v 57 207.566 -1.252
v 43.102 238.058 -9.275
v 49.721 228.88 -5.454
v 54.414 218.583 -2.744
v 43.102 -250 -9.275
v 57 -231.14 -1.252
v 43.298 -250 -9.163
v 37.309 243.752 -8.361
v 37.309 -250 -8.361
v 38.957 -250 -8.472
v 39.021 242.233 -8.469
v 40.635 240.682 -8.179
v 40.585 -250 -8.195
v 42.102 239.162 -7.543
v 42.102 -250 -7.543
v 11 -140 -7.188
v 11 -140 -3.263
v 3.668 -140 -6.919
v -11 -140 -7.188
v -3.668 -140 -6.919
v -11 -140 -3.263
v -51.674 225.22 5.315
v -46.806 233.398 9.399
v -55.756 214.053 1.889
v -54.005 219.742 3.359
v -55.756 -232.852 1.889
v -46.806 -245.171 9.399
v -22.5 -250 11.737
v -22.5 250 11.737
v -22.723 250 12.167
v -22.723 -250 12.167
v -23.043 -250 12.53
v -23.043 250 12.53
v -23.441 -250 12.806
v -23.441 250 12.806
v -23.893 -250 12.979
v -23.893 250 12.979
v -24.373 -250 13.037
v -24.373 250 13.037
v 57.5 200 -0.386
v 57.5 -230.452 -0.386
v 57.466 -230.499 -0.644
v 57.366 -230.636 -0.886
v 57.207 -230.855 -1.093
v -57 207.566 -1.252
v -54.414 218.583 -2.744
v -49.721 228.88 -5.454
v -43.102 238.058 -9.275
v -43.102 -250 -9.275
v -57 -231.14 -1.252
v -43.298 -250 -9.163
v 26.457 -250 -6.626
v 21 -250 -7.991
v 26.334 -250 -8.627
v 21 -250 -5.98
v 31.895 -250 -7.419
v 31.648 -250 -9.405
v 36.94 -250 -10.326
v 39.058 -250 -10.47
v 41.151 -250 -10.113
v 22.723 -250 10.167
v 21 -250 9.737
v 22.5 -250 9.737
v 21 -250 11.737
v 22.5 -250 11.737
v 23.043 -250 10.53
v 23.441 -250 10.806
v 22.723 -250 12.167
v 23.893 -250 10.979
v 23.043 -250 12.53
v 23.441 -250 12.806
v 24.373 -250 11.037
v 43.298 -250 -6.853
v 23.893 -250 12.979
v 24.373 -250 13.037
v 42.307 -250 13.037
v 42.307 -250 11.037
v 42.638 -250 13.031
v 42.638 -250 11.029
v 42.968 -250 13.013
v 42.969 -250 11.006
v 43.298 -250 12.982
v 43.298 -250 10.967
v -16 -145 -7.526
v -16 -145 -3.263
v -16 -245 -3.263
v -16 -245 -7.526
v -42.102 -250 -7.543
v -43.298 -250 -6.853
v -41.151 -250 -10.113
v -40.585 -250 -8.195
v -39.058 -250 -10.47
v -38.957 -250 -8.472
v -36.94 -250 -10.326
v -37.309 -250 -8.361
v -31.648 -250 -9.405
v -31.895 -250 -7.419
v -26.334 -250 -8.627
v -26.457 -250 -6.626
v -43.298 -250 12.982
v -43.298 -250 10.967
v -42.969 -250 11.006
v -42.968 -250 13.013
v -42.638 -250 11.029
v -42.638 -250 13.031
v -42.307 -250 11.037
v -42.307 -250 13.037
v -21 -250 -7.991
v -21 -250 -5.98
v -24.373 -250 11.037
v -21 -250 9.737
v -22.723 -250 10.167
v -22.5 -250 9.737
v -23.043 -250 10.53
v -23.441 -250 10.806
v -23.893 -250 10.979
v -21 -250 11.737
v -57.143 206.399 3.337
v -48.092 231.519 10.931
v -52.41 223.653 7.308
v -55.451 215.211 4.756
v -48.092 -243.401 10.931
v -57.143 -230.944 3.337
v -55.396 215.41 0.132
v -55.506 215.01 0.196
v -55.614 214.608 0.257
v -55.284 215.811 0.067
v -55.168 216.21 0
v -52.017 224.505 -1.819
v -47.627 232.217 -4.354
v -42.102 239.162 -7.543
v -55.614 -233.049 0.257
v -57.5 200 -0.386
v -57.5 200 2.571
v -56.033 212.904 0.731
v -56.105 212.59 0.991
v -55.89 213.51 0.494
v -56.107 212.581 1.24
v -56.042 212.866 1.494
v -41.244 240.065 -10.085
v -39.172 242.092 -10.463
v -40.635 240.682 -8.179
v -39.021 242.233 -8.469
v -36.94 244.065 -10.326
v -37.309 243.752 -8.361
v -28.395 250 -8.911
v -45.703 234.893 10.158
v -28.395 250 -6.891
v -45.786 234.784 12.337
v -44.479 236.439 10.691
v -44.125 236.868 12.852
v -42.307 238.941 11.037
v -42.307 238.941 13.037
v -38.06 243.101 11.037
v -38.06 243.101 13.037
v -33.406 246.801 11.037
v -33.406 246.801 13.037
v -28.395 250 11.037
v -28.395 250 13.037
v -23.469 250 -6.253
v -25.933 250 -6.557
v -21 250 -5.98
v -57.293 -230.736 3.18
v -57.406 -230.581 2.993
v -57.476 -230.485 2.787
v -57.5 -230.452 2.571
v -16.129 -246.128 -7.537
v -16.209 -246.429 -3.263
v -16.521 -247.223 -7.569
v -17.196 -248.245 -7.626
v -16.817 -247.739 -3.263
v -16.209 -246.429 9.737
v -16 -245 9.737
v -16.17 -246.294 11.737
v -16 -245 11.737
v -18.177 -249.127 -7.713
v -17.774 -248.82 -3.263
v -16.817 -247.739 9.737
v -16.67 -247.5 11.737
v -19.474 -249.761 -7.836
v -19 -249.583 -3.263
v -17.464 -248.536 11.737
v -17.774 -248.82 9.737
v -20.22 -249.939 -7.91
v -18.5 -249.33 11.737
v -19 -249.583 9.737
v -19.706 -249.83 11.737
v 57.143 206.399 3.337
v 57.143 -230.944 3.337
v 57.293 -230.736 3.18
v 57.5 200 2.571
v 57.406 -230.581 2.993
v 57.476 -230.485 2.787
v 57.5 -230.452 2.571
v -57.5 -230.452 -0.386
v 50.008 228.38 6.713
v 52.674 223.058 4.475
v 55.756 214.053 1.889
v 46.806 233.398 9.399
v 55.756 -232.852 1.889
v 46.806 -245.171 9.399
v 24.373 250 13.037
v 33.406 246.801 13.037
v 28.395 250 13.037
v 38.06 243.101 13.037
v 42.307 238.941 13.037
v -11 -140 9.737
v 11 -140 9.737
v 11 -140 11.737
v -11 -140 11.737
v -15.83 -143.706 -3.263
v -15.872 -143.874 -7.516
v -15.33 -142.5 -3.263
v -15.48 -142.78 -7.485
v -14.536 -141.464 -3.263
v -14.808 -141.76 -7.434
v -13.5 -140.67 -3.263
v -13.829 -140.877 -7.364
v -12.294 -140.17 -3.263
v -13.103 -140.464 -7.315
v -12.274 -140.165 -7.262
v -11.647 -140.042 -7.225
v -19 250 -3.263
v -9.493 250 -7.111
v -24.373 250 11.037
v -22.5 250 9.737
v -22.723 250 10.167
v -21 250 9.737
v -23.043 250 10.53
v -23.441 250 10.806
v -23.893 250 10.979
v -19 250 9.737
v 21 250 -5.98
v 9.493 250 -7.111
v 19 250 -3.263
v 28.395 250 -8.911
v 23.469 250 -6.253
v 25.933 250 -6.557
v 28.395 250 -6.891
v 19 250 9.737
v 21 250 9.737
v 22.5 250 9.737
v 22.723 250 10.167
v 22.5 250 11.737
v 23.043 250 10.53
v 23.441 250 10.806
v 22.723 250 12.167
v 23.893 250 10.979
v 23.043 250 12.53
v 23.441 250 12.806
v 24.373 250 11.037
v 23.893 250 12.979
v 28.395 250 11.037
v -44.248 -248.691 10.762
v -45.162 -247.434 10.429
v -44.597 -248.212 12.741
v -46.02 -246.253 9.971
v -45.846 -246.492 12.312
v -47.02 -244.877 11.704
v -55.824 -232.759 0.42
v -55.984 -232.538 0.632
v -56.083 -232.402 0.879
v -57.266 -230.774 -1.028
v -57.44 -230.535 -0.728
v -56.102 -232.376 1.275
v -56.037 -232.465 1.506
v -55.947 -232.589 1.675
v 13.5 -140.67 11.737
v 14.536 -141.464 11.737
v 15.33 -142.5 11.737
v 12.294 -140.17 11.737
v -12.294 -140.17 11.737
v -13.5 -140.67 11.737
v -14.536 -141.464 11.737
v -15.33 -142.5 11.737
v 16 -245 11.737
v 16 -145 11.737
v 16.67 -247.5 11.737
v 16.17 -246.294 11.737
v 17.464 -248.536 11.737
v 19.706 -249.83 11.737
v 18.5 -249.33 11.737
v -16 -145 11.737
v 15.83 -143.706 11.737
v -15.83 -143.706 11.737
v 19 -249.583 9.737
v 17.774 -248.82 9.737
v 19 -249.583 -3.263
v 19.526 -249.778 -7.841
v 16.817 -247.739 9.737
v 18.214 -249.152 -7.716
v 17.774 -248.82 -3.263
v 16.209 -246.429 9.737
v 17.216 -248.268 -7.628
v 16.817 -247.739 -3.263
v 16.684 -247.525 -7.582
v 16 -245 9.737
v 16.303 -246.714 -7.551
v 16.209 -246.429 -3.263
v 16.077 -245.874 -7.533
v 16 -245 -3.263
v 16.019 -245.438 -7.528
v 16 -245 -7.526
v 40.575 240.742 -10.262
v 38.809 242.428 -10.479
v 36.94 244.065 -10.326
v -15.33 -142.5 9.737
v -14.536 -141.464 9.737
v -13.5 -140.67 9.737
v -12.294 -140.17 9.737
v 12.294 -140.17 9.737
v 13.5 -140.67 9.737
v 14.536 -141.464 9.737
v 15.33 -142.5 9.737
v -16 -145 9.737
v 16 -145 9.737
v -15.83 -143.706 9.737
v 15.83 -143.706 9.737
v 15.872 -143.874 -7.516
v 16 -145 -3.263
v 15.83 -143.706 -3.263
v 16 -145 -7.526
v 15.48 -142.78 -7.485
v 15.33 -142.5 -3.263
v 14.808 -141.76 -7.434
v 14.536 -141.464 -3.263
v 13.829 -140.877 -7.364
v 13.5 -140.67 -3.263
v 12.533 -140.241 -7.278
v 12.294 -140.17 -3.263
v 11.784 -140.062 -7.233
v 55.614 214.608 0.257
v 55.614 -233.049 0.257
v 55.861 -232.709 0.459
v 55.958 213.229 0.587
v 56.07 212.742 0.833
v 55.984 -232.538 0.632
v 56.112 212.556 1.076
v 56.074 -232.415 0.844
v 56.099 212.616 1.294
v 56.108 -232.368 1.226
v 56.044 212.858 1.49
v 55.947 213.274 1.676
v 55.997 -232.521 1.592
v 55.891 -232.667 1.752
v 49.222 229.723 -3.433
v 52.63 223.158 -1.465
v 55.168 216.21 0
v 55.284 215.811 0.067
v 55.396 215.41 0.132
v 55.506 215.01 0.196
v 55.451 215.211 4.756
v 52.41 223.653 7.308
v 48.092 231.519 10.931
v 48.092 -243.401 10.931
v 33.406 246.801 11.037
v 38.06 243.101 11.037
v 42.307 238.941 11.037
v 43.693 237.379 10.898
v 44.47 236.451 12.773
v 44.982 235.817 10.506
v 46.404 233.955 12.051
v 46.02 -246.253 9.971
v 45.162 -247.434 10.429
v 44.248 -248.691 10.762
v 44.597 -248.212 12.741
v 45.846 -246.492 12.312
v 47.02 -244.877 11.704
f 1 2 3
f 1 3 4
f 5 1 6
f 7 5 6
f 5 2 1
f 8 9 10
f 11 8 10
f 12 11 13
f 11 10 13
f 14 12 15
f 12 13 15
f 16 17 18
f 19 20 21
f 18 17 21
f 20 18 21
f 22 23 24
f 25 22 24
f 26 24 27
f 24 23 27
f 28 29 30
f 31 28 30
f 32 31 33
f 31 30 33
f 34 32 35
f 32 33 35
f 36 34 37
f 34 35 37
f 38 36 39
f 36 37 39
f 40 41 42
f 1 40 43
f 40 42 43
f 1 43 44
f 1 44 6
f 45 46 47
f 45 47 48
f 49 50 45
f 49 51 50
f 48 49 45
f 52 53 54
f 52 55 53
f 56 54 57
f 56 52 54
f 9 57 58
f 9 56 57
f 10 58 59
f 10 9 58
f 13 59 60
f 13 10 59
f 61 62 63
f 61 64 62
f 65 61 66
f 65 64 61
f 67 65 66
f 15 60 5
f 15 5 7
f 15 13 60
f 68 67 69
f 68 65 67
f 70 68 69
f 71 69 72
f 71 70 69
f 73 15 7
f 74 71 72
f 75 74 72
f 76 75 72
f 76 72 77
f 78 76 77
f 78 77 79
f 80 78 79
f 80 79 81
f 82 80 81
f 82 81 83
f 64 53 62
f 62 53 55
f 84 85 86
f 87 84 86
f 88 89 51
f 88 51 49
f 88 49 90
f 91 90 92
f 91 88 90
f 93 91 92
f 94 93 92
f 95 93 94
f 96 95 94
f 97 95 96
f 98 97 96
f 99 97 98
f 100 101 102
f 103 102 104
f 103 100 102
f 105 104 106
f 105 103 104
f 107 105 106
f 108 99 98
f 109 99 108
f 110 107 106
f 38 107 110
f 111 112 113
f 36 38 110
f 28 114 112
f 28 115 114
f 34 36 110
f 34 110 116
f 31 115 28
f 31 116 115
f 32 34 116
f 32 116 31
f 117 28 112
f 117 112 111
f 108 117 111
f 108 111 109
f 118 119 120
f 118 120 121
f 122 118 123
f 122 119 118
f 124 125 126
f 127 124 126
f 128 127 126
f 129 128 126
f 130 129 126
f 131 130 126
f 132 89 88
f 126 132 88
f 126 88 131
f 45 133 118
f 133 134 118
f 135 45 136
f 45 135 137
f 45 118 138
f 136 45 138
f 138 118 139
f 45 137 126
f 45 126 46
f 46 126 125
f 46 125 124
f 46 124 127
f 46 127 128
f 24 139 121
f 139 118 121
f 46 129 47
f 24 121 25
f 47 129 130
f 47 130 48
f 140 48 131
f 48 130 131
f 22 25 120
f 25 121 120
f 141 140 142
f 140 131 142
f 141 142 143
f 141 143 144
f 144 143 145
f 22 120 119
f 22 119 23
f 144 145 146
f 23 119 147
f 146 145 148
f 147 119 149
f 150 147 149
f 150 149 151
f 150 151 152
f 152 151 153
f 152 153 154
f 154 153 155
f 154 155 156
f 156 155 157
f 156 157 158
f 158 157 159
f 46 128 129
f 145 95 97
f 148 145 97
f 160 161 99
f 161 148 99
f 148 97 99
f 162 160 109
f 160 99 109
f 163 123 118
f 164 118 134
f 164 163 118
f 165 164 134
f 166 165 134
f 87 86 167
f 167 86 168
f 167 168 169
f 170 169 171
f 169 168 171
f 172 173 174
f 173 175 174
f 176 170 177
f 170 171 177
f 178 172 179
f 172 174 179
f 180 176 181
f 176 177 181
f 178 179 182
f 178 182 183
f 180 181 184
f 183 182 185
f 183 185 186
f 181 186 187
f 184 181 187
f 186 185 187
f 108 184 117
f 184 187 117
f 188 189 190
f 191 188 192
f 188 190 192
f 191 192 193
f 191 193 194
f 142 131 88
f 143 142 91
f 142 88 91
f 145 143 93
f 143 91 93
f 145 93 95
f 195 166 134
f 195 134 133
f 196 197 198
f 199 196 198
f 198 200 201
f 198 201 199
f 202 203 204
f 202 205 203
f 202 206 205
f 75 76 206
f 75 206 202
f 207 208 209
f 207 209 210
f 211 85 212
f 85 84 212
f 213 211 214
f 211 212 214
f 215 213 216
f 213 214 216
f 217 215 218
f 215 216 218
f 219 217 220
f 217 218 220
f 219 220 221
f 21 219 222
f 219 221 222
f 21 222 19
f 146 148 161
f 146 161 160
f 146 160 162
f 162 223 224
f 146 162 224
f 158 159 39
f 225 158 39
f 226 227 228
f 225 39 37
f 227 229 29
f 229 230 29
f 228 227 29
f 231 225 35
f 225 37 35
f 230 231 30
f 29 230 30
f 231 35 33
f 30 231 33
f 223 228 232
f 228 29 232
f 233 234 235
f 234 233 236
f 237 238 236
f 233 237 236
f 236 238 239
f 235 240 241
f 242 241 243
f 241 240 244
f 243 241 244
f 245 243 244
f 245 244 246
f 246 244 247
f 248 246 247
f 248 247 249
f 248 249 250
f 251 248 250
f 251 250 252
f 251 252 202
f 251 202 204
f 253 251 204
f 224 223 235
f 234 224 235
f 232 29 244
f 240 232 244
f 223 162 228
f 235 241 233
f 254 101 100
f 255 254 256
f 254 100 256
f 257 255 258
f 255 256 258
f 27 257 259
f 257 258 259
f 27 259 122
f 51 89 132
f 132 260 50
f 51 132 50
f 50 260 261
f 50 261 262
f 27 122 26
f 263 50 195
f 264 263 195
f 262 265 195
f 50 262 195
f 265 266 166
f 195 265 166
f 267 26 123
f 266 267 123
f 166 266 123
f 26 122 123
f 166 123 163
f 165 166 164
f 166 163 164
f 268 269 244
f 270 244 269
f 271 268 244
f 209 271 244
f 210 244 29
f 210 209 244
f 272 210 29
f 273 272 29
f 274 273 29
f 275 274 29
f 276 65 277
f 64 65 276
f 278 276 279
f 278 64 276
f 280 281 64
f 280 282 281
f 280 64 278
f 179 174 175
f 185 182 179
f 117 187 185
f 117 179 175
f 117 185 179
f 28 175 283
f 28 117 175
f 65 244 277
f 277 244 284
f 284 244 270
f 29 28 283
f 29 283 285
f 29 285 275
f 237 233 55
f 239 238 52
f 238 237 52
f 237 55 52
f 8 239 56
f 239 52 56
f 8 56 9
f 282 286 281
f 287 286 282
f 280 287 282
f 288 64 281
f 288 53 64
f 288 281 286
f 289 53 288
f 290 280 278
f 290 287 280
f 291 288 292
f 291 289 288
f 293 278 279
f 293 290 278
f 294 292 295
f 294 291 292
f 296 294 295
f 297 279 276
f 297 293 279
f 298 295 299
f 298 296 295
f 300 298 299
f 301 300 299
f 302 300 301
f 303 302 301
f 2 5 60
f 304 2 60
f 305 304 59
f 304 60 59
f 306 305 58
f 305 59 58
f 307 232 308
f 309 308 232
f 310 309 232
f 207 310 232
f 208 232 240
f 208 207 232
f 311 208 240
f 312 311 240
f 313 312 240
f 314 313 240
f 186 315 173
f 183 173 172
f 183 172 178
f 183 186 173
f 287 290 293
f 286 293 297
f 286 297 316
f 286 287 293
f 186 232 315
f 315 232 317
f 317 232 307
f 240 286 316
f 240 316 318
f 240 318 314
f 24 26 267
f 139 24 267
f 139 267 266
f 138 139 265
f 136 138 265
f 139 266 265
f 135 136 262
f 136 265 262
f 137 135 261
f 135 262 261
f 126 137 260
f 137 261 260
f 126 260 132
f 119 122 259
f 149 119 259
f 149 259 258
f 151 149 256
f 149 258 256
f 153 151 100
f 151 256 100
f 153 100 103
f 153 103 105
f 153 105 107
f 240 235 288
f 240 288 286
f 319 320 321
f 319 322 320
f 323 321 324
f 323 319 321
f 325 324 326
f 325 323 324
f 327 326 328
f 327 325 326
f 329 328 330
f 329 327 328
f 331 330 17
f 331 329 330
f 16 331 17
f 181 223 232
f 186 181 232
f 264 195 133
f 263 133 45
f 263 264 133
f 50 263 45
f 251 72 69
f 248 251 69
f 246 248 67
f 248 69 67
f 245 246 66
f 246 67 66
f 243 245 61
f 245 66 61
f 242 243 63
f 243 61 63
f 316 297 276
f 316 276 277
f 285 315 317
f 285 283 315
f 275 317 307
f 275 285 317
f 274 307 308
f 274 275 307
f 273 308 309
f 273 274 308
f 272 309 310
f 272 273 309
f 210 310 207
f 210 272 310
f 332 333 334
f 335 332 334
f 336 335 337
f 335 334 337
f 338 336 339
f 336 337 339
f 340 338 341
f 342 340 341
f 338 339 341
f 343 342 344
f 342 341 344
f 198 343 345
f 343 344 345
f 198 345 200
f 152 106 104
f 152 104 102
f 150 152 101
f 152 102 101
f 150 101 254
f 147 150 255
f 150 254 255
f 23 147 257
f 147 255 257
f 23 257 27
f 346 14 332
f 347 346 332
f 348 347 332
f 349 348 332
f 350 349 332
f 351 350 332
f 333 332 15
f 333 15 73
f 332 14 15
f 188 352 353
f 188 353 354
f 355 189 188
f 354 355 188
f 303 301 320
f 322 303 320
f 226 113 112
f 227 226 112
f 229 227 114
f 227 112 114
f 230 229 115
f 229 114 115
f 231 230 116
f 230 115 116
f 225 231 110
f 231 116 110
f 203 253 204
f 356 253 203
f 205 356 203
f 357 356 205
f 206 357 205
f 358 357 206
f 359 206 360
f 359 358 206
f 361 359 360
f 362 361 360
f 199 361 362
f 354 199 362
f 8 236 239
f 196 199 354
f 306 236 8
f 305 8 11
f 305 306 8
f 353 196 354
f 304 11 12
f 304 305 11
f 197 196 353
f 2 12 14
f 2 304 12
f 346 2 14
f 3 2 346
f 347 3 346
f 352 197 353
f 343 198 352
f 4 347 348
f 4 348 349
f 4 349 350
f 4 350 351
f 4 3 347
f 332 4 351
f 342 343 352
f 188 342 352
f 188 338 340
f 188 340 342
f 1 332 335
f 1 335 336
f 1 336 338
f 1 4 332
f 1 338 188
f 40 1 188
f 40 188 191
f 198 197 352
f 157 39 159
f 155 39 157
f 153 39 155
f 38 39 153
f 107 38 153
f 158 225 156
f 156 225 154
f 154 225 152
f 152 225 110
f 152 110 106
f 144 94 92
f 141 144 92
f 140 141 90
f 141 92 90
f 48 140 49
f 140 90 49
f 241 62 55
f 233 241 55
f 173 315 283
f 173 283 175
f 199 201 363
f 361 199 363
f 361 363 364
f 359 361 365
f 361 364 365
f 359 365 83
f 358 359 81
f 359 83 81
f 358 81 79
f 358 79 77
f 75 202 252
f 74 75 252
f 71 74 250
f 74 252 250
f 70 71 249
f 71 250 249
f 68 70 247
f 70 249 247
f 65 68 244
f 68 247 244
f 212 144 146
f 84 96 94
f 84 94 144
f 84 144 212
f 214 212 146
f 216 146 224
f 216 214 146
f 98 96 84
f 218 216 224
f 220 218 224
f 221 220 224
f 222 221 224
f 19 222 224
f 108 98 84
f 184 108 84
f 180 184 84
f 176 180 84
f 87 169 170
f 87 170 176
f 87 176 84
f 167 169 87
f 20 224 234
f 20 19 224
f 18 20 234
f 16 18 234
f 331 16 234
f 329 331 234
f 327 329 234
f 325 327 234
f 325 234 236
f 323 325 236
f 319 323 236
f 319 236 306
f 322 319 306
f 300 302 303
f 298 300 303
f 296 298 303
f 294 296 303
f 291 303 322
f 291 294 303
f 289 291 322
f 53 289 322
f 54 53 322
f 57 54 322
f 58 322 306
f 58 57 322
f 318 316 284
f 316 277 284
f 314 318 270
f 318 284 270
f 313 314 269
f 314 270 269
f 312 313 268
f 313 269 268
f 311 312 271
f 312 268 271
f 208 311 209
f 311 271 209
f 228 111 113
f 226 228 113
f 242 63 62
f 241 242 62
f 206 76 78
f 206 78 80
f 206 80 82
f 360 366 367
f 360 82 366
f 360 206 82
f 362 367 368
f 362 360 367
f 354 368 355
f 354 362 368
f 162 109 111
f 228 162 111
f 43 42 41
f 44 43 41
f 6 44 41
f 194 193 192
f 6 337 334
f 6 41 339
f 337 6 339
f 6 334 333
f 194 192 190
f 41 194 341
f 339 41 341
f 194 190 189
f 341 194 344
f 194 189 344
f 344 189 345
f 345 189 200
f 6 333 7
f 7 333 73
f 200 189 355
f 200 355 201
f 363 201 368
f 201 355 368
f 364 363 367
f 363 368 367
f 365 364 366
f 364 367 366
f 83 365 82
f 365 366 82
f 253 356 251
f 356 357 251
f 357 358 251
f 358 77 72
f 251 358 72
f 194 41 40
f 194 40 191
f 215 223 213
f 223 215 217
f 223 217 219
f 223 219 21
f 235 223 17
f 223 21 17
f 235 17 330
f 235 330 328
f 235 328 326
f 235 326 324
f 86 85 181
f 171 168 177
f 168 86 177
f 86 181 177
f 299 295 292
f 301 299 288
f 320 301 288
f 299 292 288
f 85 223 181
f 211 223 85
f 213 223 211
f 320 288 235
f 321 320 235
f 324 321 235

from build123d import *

# Parameters (mm, degrees)
F1_DEPTH       = 250
F2_W           = 38
F2_H           = 13
F3_DEPTH       = 250
F4_T1_DEPTH    = 509.3674969976
F5_R           = 9
F6_R           = 1
F8_DEPTH       = 500.001
F10_DEPTH      = 10.482205926
F10_DEPTH_BACK = 13.0380992553
F12_DEPTH      = 13.0380993553
F12_DEPTH_BACK = 10.4822060387
F13_F1_R       = 4.9999
F13_F2_R       = 5
F13_F3_R       = 5
F13_F4_R       = 4.9999
F13_F5_R       = 5
F13_F6_R       = 5


# Not quite as in the source:
# - a fillet or chamfer that OpenCascade refuses, or shapes differently, is made with other operations: its cross-section is extruded or revolved along the edge and cut away or added
# - a fillet or chamfer is up to 0.001 mm smaller than in the source, because OpenCascade refuses the exact size


with BuildPart() as f1:
    # F0 (on Front) → F1 (new body, symmetric)
    with BuildSketch(Plane.XZ):
        with BuildLine():
            Line((22.5, 11.7370992553), (0, 11.7370992553))
            Line((0, 11.7370992553), (-22.5, 11.7370992553))
            Line((-22.5, 11.7370992553), (-22.5, 13.0370992553))
            Line((-22.5, 13.0370992553), (-45.5824640741, 13.0370992553))
            Line((-45.5824640741, 13.0370992553), (-57.5, 3.0370992553))
            Line((-57.5, 3.0370992553), (-57.5, -0.9629007447))
            Line((-57.5, -0.9629007447), (-40.1794919243, -10.9629007447))
            ThreePointArc((-40.1794919243, -10.9629007447), (0, -6.8853558863), (40.1794919243, -10.9629007447))
            Line((40.1794919243, -10.9629007447), (57.5, -0.9629007447))
            Line((57.5, -0.9629007447), (57.5, 3.0370992553))
            Line((57.5, 3.0370992553), (45.5824640741, 13.0370992553))
            Line((45.5824640741, 13.0370992553), (22.5, 13.0370992553))
            Line((22.5, 13.0370992553), (22.5, 11.7370992553))
        make_face()
    extrude(amount=F1_DEPTH, both=True)

    # F2 (on Front) → F3 (cut, symmetric)
    with BuildSketch(Plane.XZ):
        with Locations((0, 3.2370992553)):
            Rectangle(F2_W, F2_H)
    extrude(amount=F3_DEPTH, both=True, mode=Mode.SUBTRACT)

    # F4: fillet of radius 2 on 2 edges, made by hand

    # F4_s2 → F4_t1 (cut)
    with BuildSketch(Plane.XZ.offset(-254.6837484988)):
        with BuildLine():
            ThreePointArc((-22.5, 11.7370992553), (-23.2333239744, 12.6802669278), (-24.3734993995, 13.0370992553))
            Line((-24.3734993995, 13.0370992553), (-22.5, 13.0370992553))
            Line((-22.5, 13.0370992553), (-22.5, 11.7370992553))
        make_face()
        with BuildLine():
            ThreePointArc((24.3734993995, 13.0370992553), (23.2333239744, 12.6802669278), (22.5, 11.7370992553))
            Line((22.5, 11.7370992553), (22.5, 13.0370992553))
            Line((22.5, 13.0370992553), (24.3734993995, 13.0370992553))
        make_face()
    extrude(amount=F4_T1_DEPTH, mode=Mode.SUBTRACT)

    # F5
    f5_edges = [f1.edges().sort_by_distance(p)[0] for p in [
        (-45.582464, 0, 13.037099),
        (45.582464, 0, 13.037099),
        (-40.179492, 0, -10.962901),
        (40.179492, 0, -10.962901),
    ]]
    fillet(f5_edges, radius=F5_R)

    # F6
    f6_edges = [f1.edges().sort_by_distance(p)[0] for p in [
        (57.5, 0, 3.037099),
        (57.5, 0, -0.962901),
        (-57.5, 0, 3.037099),
        (-57.5, 0, -0.962901),
    ]]
    fillet(f6_edges, radius=F6_R)

    # F7 (on face) → F8 (cut, through all)
    with BuildSketch(Plane.XZ.offset(250)):
        with BuildLine():
            ThreePointArc((-42.1022690923, -7.5433837525), (-39.7790673433, -8.3815788055), (-37.3093701274, -8.3607707572))
            ThreePointArc((-37.3093701274, -8.3607707572), (-29.1789785809, -7.0039230093), (-21, -5.9799054874))
            Line((-21, -5.9799054874), (-21, 9.7370992553))
            Line((-21, 9.7370992553), (-22.5, 9.7370992553))
            ThreePointArc((-22.5, 9.7370992553), (-23.2333239744, 10.6802669278), (-24.3734993995, 11.0370992553))
            Line((-24.3734993995, 11.0370992553), (-42.3067319657, 11.0370992553))
            ThreePointArc((-42.3067319657, 11.0370992553), (-44.7008729689, 10.6149476008), (-46.8062452335, 9.3994103571))
            Line((-46.8062452335, 9.3994103571), (-55.7563117574, 1.8894128378))
            ThreePointArc((-55.7563117574, 1.8894128378), (-56.1097188459, 1.036212652), (-55.6135241478, 0.2573429909))
            Line((-55.6135241478, 0.2573429909), (-42.1022690923, -7.5433837525))
        make_face()
        with BuildLine():
            Line((55.7563117574, 1.8894128378), (46.8062452335, 9.3994103571))
            ThreePointArc((46.8062452335, 9.3994103571), (44.7008729689, 10.6149476008), (42.3067319657, 11.0370992553))
            Line((42.3067319657, 11.0370992553), (24.3734993995, 11.0370992553))
            ThreePointArc((24.3734993995, 11.0370992553), (23.2333239744, 10.6802669278), (22.5, 9.7370992553))
            Line((22.5, 9.7370992553), (21, 9.7370992553))
            Line((21, 9.7370992553), (21, -5.9799054874))
            ThreePointArc((21, -5.9799054874), (29.1789785809, -7.0039230093), (37.3093701274, -8.3607707572))
            ThreePointArc((37.3093701274, -8.3607707572), (39.7790673433, -8.3815788055), (42.1022690923, -7.5433837525))
            Line((42.1022690923, -7.5433837525), (55.6135241478, 0.2573429909))
            ThreePointArc((55.6135241478, 0.2573429909), (56.1097188459, 1.036212652), (55.7563117574, 1.8894128378))
        make_face()
    extrude(amount=-F8_DEPTH, mode=Mode.SUBTRACT)

    # F9 (on Top) → F10 (cut, two sides)
    with BuildSketch(Plane.XY) as f10_sk:
        with BuildLine():
            ThreePointArc((-57.5, 200), (0, 257.5), (57.5, 200))
            Line((57.5, 200), (57.5, 280))
            Line((57.5, 280), (-57.5, 280))
            Line((-57.5, 280), (-57.5, 200))
        make_face()
    extrude(amount=-F10_DEPTH, mode=Mode.SUBTRACT)
    extrude(f10_sk.sketch, amount=F10_DEPTH_BACK, mode=Mode.SUBTRACT)

    # F11 (on Top) → F12 (cut, two sides)
    with BuildSketch(Plane.XY) as f12_sk:
        Polygon((16, -140), (-16, -140), (-16, -250), (-43.2975540478, -250), (-68, -216), (-68, -346), (68, -346), (68, -216), (43.2975540478, -250), (16, -250), align=None)
    extrude(amount=F12_DEPTH, mode=Mode.SUBTRACT)
    extrude(f12_sk.sketch, amount=-F12_DEPTH_BACK, mode=Mode.SUBTRACT)

    # F13: fillet of radius 5 on 8 edges, made by hand

    # F13_f1 (radius 5 in the source; OpenCascade refuses exactly that, so slightly less here)
    f13_f1_edges = [f1.edges().sort_by_distance(p)[0] for p in [
        (16, -250, -5.3946419605),
    ]]
    fillet(f13_f1_edges, radius=F13_F1_R)

    # F13_f2
    f13_f2_edges = [f1.edges().sort_by_distance(p)[0] for p in [
        (16, -140, -5.3946419605),
    ]]
    fillet(f13_f2_edges, radius=F13_F2_R)

    # F13_f3
    f13_f3_edges = [f1.edges().sort_by_distance(p)[0] for p in [
        (16, -140, 10.7370992553),
    ]]
    fillet(f13_f3_edges, radius=F13_F3_R)

    # F13_f4 (radius 5 in the source; OpenCascade refuses exactly that, so slightly less here)
    f13_f4_edges = [f1.edges().sort_by_distance(p)[0] for p in [
        (-16, -250, 10.7370992553),
    ]]
    fillet(f13_f4_edges, radius=F13_F4_R)

    # F13_f5
    f13_f5_edges = [f1.edges().sort_by_distance(p)[0] for p in [
        (-16, -140, -5.3946419605),
    ]]
    fillet(f13_f5_edges, radius=F13_F5_R)

    # F13_f6
    f13_f6_edges = [f1.edges().sort_by_distance(p)[0] for p in [
        (-16, -140, 10.7370992553),
    ]]
    fillet(f13_f6_edges, radius=F13_F6_R)


solid = f1.part
